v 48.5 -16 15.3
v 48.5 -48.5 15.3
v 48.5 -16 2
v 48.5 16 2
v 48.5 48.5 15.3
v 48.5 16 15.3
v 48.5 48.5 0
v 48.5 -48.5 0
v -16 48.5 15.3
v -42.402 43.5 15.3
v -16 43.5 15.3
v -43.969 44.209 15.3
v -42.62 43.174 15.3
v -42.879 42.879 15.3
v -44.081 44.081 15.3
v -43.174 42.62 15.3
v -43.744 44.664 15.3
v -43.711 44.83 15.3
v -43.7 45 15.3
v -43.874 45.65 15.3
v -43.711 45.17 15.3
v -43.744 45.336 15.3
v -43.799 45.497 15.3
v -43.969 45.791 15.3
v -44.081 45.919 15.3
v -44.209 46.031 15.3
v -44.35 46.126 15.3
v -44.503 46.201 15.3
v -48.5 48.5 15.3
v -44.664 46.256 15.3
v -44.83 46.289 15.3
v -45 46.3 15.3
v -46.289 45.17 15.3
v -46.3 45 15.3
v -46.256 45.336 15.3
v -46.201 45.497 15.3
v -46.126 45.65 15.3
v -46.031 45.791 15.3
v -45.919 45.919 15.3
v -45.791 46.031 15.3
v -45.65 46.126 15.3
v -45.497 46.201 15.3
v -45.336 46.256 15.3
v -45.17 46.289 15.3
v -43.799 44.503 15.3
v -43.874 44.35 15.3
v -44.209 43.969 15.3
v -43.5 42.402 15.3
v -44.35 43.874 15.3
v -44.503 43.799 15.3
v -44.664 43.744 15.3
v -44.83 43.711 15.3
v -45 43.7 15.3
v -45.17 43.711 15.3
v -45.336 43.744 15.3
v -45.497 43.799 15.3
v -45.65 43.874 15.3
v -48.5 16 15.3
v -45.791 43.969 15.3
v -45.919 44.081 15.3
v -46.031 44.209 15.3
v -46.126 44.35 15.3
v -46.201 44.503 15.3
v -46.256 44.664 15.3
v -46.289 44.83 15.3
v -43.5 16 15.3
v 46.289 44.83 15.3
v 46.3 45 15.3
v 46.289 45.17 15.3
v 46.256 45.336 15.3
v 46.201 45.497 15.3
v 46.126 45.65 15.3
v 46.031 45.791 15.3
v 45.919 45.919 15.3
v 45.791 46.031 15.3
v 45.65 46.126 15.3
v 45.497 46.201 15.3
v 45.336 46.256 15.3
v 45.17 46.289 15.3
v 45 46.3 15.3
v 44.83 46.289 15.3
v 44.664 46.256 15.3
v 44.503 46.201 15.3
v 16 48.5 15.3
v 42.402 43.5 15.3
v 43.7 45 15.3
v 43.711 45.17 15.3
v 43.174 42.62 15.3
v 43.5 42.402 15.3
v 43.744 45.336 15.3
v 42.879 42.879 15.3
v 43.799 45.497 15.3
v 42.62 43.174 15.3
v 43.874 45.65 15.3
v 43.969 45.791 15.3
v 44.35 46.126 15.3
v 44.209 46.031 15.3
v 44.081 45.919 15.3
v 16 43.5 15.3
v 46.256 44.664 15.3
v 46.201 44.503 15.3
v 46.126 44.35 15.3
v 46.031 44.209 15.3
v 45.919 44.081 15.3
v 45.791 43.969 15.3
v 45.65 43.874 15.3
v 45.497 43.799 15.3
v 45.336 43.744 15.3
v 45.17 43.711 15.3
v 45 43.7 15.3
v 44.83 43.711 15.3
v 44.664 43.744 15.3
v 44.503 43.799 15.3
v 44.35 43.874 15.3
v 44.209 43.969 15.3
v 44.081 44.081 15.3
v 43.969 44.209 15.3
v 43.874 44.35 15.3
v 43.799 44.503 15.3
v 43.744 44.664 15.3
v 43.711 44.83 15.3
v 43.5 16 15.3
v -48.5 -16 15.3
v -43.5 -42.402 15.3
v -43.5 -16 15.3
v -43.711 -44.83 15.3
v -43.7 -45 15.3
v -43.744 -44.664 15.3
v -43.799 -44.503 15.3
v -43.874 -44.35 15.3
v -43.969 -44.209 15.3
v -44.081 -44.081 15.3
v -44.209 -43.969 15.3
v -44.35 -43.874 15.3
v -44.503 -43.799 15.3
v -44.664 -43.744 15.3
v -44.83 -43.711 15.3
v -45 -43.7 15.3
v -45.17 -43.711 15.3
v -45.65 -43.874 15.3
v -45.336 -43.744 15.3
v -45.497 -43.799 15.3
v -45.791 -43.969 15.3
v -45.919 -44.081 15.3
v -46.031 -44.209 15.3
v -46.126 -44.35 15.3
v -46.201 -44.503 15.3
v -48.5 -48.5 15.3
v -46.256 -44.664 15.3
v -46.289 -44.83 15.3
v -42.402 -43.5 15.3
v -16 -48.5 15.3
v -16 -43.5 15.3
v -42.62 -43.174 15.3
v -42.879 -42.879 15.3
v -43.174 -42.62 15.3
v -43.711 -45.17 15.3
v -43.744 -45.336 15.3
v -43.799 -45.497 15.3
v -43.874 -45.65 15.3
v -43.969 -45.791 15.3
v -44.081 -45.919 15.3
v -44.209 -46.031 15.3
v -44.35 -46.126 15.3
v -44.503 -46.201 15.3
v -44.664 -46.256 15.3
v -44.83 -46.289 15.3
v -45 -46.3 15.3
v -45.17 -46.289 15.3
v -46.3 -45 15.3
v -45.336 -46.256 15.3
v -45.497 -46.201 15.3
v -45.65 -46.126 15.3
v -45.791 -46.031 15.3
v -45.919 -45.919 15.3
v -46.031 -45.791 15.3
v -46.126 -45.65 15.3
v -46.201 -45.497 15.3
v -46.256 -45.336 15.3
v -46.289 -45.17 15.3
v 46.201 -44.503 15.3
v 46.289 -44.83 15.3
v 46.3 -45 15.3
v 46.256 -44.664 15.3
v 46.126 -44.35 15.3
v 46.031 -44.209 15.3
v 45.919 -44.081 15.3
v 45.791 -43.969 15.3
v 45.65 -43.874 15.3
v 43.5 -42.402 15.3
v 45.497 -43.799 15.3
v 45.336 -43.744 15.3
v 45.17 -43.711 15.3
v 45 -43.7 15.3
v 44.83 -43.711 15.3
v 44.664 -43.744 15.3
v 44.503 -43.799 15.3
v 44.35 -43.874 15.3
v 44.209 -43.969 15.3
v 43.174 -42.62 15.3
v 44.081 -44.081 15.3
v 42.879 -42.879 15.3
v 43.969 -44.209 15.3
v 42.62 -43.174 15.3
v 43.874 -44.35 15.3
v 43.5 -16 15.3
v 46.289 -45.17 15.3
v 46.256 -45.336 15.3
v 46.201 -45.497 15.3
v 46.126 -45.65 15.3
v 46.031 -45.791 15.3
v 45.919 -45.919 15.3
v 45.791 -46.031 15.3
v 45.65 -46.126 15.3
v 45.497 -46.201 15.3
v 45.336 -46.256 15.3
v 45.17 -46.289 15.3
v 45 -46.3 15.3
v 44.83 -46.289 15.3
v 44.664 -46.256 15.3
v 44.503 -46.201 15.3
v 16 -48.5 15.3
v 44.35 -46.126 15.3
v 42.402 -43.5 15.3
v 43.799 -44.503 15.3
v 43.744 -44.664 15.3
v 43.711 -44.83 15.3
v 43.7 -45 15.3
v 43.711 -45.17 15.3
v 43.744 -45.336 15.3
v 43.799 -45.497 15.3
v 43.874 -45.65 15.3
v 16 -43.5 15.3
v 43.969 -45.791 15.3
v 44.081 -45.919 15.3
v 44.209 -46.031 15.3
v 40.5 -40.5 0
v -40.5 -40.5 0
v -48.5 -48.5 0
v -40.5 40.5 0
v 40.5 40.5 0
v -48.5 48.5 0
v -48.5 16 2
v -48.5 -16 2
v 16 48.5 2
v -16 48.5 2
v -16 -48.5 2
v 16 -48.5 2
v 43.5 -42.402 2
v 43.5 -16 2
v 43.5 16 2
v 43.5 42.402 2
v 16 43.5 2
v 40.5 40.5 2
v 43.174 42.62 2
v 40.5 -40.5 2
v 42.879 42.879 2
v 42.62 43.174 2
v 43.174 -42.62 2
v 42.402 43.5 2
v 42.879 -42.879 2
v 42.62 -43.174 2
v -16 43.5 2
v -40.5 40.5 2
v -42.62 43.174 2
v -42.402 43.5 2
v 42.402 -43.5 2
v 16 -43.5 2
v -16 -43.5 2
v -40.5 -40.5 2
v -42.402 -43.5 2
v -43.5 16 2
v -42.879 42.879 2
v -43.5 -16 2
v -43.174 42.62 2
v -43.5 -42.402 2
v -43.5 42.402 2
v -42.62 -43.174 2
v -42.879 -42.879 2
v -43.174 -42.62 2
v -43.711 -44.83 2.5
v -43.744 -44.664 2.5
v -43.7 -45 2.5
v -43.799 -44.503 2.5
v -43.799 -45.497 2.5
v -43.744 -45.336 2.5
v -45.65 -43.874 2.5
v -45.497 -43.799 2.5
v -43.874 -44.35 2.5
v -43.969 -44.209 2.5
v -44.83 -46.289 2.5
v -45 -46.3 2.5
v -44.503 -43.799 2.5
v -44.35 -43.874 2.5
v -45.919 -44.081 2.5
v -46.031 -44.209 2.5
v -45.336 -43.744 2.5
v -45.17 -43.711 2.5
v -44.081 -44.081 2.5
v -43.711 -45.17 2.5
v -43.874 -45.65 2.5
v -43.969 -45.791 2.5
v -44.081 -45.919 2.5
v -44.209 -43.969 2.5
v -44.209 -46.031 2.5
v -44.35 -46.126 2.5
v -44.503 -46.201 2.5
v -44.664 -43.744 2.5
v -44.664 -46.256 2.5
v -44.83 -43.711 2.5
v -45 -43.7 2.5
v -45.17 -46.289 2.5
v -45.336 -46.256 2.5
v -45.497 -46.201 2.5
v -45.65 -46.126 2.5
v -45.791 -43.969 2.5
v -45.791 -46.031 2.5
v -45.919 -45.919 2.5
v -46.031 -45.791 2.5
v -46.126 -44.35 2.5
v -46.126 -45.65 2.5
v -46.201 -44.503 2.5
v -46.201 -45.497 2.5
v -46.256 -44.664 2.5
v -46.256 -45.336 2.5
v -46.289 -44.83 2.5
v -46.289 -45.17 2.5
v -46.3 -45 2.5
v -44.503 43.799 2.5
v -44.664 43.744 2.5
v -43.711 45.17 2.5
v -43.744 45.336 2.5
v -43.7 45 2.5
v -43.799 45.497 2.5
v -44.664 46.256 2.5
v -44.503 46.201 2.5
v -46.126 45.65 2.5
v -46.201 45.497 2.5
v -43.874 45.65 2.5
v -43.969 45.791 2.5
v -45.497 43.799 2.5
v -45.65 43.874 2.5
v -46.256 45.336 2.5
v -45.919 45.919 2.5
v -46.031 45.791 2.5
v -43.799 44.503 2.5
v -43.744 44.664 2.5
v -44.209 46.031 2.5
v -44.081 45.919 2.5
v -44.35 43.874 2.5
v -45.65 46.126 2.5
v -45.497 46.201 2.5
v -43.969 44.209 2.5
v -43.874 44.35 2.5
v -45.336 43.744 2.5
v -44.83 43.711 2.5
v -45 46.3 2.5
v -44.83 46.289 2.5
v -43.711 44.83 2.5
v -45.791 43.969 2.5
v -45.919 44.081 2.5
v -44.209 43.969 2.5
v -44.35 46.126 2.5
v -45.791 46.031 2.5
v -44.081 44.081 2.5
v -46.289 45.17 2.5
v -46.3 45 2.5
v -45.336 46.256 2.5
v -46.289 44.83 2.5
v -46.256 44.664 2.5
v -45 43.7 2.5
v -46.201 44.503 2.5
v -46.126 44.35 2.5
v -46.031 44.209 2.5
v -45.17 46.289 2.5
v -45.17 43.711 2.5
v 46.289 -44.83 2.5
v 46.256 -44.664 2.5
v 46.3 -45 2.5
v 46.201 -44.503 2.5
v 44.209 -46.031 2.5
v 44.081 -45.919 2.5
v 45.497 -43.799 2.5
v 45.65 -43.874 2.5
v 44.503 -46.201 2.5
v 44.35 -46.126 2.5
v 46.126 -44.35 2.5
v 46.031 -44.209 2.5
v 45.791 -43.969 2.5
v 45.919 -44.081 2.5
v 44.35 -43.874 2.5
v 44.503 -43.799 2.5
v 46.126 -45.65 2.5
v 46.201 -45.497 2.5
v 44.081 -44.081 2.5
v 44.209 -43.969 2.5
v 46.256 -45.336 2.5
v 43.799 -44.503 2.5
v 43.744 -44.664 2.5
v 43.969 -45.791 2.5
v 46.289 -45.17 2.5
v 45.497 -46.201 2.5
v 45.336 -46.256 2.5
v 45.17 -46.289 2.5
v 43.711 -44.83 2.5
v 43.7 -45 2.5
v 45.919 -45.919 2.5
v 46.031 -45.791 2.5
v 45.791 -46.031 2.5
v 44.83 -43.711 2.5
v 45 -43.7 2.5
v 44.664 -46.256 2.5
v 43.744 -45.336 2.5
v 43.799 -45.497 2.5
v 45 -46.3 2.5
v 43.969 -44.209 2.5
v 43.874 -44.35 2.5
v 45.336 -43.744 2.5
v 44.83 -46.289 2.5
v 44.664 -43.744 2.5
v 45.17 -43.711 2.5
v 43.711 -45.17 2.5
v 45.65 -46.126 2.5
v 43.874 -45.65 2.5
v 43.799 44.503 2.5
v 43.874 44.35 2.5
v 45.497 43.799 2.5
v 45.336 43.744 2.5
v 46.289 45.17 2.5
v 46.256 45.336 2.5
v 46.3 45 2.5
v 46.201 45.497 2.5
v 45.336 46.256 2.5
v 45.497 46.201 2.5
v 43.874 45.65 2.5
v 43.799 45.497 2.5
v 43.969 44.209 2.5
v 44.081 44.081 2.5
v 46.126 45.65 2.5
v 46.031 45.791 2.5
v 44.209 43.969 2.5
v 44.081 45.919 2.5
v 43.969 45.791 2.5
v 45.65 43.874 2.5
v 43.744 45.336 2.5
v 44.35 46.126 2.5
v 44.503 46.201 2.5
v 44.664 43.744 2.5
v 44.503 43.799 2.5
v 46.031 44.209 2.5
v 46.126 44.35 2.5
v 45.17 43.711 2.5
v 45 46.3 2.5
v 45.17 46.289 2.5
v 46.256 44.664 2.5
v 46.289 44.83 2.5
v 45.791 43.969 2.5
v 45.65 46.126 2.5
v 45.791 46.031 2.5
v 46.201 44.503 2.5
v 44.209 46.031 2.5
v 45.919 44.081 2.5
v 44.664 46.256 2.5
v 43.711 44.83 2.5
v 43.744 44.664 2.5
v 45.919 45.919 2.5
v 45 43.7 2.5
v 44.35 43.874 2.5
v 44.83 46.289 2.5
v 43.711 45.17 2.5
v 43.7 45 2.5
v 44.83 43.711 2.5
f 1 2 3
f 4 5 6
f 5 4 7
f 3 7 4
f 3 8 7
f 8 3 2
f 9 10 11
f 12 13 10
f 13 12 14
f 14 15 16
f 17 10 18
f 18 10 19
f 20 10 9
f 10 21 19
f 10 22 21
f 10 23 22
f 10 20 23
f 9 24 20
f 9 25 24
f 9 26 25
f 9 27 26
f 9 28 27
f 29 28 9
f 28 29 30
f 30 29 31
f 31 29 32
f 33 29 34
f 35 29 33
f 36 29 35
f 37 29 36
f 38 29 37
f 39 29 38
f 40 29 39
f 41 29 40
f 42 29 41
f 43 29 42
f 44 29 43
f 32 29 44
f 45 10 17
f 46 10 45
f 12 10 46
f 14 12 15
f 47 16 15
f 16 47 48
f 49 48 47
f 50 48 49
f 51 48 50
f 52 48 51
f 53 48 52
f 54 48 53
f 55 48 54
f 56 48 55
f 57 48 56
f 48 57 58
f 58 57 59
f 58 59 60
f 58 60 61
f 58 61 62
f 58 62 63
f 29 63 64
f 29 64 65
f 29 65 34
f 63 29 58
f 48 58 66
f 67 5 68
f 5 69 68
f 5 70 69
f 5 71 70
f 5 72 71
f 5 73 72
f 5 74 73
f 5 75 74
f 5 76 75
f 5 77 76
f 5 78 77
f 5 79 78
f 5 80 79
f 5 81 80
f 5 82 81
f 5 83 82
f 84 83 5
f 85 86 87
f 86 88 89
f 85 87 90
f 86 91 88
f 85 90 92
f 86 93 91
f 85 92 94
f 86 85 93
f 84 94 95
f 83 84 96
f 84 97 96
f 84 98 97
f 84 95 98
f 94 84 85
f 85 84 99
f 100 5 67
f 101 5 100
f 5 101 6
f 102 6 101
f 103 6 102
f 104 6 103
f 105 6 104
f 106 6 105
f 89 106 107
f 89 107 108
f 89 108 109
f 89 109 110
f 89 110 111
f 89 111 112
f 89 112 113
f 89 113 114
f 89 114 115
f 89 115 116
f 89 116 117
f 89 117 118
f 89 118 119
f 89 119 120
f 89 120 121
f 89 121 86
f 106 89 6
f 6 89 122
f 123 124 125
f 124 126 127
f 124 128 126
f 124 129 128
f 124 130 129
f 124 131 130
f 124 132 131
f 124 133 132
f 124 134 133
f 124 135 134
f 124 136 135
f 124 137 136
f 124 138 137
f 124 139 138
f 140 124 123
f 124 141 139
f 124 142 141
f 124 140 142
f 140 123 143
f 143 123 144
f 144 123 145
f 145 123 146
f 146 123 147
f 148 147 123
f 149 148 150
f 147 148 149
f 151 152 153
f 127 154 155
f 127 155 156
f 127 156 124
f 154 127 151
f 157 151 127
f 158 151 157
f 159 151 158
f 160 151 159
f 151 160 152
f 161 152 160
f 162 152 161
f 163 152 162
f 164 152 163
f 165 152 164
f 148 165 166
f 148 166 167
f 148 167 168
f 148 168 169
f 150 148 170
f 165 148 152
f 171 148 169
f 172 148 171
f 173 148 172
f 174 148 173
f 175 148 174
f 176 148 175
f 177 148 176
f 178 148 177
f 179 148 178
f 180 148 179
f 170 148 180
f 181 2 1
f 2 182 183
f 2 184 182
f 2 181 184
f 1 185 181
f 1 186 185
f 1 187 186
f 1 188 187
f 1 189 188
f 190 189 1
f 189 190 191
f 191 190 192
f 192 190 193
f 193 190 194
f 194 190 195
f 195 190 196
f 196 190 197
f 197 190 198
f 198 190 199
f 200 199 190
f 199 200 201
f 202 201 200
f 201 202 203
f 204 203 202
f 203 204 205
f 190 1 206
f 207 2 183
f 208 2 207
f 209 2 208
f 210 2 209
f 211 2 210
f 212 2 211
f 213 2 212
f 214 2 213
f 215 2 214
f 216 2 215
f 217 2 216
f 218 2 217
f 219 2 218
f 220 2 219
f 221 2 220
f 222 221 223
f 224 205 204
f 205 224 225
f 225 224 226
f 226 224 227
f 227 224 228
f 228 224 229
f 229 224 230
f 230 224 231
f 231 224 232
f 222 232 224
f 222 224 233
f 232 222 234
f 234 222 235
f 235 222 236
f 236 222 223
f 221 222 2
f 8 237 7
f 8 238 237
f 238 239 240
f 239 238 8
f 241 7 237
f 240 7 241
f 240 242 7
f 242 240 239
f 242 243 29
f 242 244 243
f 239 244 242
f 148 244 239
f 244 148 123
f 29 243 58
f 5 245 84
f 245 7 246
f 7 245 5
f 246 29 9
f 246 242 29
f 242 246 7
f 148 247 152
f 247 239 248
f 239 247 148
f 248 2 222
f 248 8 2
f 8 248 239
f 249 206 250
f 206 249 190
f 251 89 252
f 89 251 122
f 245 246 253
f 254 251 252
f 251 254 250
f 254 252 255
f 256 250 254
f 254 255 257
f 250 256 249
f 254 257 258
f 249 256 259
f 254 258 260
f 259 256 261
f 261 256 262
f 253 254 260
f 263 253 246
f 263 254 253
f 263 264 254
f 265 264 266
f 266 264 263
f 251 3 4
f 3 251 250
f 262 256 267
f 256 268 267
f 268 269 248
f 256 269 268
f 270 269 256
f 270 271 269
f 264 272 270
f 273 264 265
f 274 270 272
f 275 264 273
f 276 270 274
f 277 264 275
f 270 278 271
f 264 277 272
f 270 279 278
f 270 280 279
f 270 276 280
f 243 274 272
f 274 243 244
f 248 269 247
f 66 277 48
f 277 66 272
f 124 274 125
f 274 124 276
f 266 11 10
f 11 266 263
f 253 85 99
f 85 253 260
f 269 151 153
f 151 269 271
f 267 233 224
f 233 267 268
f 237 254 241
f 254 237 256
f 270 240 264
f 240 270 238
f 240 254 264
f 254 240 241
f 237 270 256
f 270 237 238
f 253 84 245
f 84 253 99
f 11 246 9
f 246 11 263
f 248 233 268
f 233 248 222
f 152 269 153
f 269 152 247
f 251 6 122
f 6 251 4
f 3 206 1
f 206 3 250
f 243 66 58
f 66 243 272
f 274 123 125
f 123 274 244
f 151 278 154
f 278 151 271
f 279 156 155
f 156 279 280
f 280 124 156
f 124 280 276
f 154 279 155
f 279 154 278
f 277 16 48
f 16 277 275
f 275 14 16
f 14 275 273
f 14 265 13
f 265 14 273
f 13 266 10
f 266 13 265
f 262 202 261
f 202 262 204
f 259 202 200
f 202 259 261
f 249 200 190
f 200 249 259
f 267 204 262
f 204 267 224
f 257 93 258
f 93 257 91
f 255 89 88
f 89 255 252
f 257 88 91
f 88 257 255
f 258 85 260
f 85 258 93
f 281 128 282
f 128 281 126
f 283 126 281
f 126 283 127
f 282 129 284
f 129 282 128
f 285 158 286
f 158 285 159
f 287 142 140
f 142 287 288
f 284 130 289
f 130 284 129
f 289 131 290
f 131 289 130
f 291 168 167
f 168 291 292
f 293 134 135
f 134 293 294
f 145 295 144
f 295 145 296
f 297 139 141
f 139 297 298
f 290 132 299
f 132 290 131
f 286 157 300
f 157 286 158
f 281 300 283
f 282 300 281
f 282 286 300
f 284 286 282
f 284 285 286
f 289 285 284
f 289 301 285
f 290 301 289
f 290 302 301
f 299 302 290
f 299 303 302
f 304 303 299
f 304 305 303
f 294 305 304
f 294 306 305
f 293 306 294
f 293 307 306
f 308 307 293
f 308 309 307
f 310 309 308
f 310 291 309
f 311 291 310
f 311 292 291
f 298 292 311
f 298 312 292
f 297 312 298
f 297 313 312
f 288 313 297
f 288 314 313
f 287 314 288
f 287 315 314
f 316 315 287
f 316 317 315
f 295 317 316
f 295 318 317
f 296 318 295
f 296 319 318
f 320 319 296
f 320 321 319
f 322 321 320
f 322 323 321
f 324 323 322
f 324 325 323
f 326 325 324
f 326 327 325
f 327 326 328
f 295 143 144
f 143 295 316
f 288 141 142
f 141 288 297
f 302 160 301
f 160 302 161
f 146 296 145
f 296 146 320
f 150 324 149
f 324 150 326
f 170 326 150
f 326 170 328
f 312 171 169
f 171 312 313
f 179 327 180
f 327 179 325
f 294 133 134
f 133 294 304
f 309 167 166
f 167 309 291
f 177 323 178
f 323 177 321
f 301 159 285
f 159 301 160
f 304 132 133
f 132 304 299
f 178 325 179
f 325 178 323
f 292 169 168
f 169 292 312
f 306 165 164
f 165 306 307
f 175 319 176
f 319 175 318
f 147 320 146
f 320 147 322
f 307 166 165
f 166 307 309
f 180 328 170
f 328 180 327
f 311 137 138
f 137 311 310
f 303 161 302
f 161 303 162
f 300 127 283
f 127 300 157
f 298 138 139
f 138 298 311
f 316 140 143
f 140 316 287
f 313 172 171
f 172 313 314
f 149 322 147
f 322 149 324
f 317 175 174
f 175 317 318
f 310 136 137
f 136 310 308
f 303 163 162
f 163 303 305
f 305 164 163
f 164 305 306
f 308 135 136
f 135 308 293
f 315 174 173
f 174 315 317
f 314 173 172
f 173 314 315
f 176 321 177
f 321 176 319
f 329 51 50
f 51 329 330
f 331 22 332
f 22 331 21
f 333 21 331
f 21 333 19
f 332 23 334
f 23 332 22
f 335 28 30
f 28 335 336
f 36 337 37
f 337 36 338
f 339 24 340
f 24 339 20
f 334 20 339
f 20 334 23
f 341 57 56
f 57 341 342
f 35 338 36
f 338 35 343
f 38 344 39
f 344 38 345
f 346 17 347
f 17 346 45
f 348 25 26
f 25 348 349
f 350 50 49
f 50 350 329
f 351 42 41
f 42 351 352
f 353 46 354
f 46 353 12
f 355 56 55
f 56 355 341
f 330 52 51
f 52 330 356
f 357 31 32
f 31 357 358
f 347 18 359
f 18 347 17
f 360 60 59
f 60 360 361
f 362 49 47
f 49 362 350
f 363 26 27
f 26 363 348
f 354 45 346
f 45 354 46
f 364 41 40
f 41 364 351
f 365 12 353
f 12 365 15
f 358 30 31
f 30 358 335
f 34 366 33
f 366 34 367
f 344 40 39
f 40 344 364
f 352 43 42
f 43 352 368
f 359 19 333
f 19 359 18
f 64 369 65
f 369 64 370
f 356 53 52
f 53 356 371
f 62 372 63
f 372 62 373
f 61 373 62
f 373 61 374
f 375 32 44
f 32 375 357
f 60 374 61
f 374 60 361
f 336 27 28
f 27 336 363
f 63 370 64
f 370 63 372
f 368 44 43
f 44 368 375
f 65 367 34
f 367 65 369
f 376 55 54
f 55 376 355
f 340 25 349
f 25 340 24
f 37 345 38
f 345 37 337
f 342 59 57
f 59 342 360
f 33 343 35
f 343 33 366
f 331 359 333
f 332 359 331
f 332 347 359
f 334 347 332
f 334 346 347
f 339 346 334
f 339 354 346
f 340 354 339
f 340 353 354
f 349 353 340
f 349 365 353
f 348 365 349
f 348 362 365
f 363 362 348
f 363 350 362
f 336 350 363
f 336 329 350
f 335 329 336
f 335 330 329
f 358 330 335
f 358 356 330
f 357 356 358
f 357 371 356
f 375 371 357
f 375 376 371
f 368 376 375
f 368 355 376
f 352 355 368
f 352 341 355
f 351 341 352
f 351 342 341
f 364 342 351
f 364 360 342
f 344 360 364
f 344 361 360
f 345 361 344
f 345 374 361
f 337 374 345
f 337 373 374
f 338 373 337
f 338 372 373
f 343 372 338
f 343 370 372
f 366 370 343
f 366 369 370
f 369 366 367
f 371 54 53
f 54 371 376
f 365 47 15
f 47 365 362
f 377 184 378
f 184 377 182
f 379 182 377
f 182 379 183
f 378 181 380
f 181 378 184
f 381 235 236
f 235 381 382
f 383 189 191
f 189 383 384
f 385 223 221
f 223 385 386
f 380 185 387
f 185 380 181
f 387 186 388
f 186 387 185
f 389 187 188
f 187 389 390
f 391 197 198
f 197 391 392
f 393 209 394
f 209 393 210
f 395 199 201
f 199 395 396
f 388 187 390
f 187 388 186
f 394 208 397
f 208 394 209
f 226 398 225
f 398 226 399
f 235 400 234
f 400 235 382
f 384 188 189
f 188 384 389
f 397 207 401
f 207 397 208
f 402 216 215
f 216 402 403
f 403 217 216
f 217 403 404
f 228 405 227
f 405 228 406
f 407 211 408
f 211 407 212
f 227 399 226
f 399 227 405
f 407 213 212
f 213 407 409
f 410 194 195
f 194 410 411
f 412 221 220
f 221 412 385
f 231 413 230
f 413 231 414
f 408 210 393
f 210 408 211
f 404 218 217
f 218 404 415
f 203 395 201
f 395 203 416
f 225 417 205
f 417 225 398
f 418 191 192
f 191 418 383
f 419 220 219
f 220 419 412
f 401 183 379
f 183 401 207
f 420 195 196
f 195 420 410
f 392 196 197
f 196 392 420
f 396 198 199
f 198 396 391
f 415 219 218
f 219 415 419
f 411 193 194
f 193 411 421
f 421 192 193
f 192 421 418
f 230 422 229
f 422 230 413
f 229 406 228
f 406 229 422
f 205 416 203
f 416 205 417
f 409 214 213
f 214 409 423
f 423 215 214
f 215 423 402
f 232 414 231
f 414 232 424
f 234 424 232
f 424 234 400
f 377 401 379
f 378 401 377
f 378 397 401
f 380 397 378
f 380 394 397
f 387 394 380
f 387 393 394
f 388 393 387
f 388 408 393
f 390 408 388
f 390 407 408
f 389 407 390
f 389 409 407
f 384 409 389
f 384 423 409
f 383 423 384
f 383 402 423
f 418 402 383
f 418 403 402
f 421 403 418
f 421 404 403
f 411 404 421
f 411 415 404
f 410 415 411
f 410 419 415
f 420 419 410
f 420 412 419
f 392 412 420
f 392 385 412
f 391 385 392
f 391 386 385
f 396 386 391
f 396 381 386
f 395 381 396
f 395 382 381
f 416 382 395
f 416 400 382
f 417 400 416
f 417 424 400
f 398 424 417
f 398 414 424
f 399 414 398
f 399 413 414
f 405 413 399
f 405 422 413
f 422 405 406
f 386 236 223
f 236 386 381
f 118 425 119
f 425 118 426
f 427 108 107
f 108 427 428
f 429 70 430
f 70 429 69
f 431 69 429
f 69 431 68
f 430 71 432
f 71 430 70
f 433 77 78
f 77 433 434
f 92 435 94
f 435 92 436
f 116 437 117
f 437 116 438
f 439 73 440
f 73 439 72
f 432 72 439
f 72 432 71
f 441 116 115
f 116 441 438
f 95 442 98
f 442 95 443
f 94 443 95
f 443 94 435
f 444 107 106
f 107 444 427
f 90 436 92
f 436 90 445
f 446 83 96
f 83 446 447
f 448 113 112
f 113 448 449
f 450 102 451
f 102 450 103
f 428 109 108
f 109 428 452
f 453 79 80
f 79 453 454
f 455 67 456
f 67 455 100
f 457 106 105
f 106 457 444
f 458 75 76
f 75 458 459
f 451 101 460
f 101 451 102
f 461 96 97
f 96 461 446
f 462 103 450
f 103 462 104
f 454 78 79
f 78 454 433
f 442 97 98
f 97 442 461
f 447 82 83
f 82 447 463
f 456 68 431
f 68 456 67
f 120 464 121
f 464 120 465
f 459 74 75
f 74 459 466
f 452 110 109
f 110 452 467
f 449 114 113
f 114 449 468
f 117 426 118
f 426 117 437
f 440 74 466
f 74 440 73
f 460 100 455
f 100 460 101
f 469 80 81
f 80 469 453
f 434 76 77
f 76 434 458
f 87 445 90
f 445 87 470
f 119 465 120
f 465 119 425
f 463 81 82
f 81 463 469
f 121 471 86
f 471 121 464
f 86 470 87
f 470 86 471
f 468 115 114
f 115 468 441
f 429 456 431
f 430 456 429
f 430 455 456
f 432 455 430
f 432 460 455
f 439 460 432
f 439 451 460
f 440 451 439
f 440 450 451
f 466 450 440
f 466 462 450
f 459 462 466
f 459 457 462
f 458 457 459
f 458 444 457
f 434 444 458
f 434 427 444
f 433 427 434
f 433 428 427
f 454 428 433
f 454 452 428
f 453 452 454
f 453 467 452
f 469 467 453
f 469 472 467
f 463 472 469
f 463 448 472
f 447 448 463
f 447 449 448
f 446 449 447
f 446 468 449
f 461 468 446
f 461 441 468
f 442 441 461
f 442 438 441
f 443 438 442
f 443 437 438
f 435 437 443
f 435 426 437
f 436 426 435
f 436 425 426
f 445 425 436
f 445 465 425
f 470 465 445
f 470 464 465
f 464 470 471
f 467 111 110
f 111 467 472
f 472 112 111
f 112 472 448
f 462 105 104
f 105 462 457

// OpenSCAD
// =============================================================================
// MusicPanel enclosure — SHELL v2 (corrected to 85.7 mm, notch A, mount bosses)
//
// Panel presses in from the back; front lip holds it; walls grip it (the fit you
// confirmed on the coupon). Cord-exit notch on all four edges (wide enough that
// the off-center USB-C port clears in any 90° rotation). Four corner bosses form
// a square pattern the wall plate / desk stand screw into.
//
// Print front-face-DOWN (lip on the bed, open back up). No supports.
//
// >>> If the panel isn't exactly 85.7, change panel_side and re-render. <<<
// =============================================================================

/* ---- panel (mm) ---- */
panel_side      = 86.6;    // confirmed: fit at +1% -> 86.6 mm
panel_thickness = 13.0;
fit_gap         = 0.4;     // confirmed on the coupon
depth_gap       = 0.3;

/* ---- shell ---- */
wall          = 5.0;       // thicker walls to house the corner screw bosses
lip_overhang  = 3.0;
lip_thickness = 2.0;
cord_w        = 32.0;      // notch A: wide, centered — clears the offset port in any rotation
boss_r        = 3.0;
pilot_r       = 1.3;       // M3 self-tapping pilot

/* ---- derived ---- */
pocket = panel_side + fit_gap;
outer  = pocket + 2*wall;
pd     = panel_thickness + depth_gap;
window = pocket - 2*lip_overhang;
H      = lip_thickness + pd;
o=outer/2; p=pocket/2; w=window/2; c=cord_w/2; bc=o-3.5;
$fn=48;

module box(x0,x1,y0,y1,z0,z1) translate([x0,y0,z0]) cube([x1-x0,y1-y0,z1-z0]);

difference() {
    union() {
        difference() {
            box(-o,o,-o,o,0,H);                        // outer block
            box(-p,p,-p,p,lip_thickness,H+1);          // panel cavity (open back)
            box(-w,w,-w,w,-1,lip_thickness+0.01);      // screen window
            box(-c,c,p-0.01,o+1,lip_thickness,H+1);    // cord notches, 4 edges
            box(-c,c,-o-1,-p+0.01,lip_thickness,H+1);
            box(p-0.01,o+1,-c,c,lip_thickness,H+1);
            box(-o-1,-p+0.01,-c,c,lip_thickness,H+1);
        }
        for (sx=[-1,1], sy=[-1,1]) translate([sx*bc,sy*bc,0]) cylinder(h=H, r=boss_r);
    }
    for (sx=[-1,1], sy=[-1,1]) translate([sx*bc,sy*bc,2.5]) cylinder(h=H, r=pilot_r);
}
